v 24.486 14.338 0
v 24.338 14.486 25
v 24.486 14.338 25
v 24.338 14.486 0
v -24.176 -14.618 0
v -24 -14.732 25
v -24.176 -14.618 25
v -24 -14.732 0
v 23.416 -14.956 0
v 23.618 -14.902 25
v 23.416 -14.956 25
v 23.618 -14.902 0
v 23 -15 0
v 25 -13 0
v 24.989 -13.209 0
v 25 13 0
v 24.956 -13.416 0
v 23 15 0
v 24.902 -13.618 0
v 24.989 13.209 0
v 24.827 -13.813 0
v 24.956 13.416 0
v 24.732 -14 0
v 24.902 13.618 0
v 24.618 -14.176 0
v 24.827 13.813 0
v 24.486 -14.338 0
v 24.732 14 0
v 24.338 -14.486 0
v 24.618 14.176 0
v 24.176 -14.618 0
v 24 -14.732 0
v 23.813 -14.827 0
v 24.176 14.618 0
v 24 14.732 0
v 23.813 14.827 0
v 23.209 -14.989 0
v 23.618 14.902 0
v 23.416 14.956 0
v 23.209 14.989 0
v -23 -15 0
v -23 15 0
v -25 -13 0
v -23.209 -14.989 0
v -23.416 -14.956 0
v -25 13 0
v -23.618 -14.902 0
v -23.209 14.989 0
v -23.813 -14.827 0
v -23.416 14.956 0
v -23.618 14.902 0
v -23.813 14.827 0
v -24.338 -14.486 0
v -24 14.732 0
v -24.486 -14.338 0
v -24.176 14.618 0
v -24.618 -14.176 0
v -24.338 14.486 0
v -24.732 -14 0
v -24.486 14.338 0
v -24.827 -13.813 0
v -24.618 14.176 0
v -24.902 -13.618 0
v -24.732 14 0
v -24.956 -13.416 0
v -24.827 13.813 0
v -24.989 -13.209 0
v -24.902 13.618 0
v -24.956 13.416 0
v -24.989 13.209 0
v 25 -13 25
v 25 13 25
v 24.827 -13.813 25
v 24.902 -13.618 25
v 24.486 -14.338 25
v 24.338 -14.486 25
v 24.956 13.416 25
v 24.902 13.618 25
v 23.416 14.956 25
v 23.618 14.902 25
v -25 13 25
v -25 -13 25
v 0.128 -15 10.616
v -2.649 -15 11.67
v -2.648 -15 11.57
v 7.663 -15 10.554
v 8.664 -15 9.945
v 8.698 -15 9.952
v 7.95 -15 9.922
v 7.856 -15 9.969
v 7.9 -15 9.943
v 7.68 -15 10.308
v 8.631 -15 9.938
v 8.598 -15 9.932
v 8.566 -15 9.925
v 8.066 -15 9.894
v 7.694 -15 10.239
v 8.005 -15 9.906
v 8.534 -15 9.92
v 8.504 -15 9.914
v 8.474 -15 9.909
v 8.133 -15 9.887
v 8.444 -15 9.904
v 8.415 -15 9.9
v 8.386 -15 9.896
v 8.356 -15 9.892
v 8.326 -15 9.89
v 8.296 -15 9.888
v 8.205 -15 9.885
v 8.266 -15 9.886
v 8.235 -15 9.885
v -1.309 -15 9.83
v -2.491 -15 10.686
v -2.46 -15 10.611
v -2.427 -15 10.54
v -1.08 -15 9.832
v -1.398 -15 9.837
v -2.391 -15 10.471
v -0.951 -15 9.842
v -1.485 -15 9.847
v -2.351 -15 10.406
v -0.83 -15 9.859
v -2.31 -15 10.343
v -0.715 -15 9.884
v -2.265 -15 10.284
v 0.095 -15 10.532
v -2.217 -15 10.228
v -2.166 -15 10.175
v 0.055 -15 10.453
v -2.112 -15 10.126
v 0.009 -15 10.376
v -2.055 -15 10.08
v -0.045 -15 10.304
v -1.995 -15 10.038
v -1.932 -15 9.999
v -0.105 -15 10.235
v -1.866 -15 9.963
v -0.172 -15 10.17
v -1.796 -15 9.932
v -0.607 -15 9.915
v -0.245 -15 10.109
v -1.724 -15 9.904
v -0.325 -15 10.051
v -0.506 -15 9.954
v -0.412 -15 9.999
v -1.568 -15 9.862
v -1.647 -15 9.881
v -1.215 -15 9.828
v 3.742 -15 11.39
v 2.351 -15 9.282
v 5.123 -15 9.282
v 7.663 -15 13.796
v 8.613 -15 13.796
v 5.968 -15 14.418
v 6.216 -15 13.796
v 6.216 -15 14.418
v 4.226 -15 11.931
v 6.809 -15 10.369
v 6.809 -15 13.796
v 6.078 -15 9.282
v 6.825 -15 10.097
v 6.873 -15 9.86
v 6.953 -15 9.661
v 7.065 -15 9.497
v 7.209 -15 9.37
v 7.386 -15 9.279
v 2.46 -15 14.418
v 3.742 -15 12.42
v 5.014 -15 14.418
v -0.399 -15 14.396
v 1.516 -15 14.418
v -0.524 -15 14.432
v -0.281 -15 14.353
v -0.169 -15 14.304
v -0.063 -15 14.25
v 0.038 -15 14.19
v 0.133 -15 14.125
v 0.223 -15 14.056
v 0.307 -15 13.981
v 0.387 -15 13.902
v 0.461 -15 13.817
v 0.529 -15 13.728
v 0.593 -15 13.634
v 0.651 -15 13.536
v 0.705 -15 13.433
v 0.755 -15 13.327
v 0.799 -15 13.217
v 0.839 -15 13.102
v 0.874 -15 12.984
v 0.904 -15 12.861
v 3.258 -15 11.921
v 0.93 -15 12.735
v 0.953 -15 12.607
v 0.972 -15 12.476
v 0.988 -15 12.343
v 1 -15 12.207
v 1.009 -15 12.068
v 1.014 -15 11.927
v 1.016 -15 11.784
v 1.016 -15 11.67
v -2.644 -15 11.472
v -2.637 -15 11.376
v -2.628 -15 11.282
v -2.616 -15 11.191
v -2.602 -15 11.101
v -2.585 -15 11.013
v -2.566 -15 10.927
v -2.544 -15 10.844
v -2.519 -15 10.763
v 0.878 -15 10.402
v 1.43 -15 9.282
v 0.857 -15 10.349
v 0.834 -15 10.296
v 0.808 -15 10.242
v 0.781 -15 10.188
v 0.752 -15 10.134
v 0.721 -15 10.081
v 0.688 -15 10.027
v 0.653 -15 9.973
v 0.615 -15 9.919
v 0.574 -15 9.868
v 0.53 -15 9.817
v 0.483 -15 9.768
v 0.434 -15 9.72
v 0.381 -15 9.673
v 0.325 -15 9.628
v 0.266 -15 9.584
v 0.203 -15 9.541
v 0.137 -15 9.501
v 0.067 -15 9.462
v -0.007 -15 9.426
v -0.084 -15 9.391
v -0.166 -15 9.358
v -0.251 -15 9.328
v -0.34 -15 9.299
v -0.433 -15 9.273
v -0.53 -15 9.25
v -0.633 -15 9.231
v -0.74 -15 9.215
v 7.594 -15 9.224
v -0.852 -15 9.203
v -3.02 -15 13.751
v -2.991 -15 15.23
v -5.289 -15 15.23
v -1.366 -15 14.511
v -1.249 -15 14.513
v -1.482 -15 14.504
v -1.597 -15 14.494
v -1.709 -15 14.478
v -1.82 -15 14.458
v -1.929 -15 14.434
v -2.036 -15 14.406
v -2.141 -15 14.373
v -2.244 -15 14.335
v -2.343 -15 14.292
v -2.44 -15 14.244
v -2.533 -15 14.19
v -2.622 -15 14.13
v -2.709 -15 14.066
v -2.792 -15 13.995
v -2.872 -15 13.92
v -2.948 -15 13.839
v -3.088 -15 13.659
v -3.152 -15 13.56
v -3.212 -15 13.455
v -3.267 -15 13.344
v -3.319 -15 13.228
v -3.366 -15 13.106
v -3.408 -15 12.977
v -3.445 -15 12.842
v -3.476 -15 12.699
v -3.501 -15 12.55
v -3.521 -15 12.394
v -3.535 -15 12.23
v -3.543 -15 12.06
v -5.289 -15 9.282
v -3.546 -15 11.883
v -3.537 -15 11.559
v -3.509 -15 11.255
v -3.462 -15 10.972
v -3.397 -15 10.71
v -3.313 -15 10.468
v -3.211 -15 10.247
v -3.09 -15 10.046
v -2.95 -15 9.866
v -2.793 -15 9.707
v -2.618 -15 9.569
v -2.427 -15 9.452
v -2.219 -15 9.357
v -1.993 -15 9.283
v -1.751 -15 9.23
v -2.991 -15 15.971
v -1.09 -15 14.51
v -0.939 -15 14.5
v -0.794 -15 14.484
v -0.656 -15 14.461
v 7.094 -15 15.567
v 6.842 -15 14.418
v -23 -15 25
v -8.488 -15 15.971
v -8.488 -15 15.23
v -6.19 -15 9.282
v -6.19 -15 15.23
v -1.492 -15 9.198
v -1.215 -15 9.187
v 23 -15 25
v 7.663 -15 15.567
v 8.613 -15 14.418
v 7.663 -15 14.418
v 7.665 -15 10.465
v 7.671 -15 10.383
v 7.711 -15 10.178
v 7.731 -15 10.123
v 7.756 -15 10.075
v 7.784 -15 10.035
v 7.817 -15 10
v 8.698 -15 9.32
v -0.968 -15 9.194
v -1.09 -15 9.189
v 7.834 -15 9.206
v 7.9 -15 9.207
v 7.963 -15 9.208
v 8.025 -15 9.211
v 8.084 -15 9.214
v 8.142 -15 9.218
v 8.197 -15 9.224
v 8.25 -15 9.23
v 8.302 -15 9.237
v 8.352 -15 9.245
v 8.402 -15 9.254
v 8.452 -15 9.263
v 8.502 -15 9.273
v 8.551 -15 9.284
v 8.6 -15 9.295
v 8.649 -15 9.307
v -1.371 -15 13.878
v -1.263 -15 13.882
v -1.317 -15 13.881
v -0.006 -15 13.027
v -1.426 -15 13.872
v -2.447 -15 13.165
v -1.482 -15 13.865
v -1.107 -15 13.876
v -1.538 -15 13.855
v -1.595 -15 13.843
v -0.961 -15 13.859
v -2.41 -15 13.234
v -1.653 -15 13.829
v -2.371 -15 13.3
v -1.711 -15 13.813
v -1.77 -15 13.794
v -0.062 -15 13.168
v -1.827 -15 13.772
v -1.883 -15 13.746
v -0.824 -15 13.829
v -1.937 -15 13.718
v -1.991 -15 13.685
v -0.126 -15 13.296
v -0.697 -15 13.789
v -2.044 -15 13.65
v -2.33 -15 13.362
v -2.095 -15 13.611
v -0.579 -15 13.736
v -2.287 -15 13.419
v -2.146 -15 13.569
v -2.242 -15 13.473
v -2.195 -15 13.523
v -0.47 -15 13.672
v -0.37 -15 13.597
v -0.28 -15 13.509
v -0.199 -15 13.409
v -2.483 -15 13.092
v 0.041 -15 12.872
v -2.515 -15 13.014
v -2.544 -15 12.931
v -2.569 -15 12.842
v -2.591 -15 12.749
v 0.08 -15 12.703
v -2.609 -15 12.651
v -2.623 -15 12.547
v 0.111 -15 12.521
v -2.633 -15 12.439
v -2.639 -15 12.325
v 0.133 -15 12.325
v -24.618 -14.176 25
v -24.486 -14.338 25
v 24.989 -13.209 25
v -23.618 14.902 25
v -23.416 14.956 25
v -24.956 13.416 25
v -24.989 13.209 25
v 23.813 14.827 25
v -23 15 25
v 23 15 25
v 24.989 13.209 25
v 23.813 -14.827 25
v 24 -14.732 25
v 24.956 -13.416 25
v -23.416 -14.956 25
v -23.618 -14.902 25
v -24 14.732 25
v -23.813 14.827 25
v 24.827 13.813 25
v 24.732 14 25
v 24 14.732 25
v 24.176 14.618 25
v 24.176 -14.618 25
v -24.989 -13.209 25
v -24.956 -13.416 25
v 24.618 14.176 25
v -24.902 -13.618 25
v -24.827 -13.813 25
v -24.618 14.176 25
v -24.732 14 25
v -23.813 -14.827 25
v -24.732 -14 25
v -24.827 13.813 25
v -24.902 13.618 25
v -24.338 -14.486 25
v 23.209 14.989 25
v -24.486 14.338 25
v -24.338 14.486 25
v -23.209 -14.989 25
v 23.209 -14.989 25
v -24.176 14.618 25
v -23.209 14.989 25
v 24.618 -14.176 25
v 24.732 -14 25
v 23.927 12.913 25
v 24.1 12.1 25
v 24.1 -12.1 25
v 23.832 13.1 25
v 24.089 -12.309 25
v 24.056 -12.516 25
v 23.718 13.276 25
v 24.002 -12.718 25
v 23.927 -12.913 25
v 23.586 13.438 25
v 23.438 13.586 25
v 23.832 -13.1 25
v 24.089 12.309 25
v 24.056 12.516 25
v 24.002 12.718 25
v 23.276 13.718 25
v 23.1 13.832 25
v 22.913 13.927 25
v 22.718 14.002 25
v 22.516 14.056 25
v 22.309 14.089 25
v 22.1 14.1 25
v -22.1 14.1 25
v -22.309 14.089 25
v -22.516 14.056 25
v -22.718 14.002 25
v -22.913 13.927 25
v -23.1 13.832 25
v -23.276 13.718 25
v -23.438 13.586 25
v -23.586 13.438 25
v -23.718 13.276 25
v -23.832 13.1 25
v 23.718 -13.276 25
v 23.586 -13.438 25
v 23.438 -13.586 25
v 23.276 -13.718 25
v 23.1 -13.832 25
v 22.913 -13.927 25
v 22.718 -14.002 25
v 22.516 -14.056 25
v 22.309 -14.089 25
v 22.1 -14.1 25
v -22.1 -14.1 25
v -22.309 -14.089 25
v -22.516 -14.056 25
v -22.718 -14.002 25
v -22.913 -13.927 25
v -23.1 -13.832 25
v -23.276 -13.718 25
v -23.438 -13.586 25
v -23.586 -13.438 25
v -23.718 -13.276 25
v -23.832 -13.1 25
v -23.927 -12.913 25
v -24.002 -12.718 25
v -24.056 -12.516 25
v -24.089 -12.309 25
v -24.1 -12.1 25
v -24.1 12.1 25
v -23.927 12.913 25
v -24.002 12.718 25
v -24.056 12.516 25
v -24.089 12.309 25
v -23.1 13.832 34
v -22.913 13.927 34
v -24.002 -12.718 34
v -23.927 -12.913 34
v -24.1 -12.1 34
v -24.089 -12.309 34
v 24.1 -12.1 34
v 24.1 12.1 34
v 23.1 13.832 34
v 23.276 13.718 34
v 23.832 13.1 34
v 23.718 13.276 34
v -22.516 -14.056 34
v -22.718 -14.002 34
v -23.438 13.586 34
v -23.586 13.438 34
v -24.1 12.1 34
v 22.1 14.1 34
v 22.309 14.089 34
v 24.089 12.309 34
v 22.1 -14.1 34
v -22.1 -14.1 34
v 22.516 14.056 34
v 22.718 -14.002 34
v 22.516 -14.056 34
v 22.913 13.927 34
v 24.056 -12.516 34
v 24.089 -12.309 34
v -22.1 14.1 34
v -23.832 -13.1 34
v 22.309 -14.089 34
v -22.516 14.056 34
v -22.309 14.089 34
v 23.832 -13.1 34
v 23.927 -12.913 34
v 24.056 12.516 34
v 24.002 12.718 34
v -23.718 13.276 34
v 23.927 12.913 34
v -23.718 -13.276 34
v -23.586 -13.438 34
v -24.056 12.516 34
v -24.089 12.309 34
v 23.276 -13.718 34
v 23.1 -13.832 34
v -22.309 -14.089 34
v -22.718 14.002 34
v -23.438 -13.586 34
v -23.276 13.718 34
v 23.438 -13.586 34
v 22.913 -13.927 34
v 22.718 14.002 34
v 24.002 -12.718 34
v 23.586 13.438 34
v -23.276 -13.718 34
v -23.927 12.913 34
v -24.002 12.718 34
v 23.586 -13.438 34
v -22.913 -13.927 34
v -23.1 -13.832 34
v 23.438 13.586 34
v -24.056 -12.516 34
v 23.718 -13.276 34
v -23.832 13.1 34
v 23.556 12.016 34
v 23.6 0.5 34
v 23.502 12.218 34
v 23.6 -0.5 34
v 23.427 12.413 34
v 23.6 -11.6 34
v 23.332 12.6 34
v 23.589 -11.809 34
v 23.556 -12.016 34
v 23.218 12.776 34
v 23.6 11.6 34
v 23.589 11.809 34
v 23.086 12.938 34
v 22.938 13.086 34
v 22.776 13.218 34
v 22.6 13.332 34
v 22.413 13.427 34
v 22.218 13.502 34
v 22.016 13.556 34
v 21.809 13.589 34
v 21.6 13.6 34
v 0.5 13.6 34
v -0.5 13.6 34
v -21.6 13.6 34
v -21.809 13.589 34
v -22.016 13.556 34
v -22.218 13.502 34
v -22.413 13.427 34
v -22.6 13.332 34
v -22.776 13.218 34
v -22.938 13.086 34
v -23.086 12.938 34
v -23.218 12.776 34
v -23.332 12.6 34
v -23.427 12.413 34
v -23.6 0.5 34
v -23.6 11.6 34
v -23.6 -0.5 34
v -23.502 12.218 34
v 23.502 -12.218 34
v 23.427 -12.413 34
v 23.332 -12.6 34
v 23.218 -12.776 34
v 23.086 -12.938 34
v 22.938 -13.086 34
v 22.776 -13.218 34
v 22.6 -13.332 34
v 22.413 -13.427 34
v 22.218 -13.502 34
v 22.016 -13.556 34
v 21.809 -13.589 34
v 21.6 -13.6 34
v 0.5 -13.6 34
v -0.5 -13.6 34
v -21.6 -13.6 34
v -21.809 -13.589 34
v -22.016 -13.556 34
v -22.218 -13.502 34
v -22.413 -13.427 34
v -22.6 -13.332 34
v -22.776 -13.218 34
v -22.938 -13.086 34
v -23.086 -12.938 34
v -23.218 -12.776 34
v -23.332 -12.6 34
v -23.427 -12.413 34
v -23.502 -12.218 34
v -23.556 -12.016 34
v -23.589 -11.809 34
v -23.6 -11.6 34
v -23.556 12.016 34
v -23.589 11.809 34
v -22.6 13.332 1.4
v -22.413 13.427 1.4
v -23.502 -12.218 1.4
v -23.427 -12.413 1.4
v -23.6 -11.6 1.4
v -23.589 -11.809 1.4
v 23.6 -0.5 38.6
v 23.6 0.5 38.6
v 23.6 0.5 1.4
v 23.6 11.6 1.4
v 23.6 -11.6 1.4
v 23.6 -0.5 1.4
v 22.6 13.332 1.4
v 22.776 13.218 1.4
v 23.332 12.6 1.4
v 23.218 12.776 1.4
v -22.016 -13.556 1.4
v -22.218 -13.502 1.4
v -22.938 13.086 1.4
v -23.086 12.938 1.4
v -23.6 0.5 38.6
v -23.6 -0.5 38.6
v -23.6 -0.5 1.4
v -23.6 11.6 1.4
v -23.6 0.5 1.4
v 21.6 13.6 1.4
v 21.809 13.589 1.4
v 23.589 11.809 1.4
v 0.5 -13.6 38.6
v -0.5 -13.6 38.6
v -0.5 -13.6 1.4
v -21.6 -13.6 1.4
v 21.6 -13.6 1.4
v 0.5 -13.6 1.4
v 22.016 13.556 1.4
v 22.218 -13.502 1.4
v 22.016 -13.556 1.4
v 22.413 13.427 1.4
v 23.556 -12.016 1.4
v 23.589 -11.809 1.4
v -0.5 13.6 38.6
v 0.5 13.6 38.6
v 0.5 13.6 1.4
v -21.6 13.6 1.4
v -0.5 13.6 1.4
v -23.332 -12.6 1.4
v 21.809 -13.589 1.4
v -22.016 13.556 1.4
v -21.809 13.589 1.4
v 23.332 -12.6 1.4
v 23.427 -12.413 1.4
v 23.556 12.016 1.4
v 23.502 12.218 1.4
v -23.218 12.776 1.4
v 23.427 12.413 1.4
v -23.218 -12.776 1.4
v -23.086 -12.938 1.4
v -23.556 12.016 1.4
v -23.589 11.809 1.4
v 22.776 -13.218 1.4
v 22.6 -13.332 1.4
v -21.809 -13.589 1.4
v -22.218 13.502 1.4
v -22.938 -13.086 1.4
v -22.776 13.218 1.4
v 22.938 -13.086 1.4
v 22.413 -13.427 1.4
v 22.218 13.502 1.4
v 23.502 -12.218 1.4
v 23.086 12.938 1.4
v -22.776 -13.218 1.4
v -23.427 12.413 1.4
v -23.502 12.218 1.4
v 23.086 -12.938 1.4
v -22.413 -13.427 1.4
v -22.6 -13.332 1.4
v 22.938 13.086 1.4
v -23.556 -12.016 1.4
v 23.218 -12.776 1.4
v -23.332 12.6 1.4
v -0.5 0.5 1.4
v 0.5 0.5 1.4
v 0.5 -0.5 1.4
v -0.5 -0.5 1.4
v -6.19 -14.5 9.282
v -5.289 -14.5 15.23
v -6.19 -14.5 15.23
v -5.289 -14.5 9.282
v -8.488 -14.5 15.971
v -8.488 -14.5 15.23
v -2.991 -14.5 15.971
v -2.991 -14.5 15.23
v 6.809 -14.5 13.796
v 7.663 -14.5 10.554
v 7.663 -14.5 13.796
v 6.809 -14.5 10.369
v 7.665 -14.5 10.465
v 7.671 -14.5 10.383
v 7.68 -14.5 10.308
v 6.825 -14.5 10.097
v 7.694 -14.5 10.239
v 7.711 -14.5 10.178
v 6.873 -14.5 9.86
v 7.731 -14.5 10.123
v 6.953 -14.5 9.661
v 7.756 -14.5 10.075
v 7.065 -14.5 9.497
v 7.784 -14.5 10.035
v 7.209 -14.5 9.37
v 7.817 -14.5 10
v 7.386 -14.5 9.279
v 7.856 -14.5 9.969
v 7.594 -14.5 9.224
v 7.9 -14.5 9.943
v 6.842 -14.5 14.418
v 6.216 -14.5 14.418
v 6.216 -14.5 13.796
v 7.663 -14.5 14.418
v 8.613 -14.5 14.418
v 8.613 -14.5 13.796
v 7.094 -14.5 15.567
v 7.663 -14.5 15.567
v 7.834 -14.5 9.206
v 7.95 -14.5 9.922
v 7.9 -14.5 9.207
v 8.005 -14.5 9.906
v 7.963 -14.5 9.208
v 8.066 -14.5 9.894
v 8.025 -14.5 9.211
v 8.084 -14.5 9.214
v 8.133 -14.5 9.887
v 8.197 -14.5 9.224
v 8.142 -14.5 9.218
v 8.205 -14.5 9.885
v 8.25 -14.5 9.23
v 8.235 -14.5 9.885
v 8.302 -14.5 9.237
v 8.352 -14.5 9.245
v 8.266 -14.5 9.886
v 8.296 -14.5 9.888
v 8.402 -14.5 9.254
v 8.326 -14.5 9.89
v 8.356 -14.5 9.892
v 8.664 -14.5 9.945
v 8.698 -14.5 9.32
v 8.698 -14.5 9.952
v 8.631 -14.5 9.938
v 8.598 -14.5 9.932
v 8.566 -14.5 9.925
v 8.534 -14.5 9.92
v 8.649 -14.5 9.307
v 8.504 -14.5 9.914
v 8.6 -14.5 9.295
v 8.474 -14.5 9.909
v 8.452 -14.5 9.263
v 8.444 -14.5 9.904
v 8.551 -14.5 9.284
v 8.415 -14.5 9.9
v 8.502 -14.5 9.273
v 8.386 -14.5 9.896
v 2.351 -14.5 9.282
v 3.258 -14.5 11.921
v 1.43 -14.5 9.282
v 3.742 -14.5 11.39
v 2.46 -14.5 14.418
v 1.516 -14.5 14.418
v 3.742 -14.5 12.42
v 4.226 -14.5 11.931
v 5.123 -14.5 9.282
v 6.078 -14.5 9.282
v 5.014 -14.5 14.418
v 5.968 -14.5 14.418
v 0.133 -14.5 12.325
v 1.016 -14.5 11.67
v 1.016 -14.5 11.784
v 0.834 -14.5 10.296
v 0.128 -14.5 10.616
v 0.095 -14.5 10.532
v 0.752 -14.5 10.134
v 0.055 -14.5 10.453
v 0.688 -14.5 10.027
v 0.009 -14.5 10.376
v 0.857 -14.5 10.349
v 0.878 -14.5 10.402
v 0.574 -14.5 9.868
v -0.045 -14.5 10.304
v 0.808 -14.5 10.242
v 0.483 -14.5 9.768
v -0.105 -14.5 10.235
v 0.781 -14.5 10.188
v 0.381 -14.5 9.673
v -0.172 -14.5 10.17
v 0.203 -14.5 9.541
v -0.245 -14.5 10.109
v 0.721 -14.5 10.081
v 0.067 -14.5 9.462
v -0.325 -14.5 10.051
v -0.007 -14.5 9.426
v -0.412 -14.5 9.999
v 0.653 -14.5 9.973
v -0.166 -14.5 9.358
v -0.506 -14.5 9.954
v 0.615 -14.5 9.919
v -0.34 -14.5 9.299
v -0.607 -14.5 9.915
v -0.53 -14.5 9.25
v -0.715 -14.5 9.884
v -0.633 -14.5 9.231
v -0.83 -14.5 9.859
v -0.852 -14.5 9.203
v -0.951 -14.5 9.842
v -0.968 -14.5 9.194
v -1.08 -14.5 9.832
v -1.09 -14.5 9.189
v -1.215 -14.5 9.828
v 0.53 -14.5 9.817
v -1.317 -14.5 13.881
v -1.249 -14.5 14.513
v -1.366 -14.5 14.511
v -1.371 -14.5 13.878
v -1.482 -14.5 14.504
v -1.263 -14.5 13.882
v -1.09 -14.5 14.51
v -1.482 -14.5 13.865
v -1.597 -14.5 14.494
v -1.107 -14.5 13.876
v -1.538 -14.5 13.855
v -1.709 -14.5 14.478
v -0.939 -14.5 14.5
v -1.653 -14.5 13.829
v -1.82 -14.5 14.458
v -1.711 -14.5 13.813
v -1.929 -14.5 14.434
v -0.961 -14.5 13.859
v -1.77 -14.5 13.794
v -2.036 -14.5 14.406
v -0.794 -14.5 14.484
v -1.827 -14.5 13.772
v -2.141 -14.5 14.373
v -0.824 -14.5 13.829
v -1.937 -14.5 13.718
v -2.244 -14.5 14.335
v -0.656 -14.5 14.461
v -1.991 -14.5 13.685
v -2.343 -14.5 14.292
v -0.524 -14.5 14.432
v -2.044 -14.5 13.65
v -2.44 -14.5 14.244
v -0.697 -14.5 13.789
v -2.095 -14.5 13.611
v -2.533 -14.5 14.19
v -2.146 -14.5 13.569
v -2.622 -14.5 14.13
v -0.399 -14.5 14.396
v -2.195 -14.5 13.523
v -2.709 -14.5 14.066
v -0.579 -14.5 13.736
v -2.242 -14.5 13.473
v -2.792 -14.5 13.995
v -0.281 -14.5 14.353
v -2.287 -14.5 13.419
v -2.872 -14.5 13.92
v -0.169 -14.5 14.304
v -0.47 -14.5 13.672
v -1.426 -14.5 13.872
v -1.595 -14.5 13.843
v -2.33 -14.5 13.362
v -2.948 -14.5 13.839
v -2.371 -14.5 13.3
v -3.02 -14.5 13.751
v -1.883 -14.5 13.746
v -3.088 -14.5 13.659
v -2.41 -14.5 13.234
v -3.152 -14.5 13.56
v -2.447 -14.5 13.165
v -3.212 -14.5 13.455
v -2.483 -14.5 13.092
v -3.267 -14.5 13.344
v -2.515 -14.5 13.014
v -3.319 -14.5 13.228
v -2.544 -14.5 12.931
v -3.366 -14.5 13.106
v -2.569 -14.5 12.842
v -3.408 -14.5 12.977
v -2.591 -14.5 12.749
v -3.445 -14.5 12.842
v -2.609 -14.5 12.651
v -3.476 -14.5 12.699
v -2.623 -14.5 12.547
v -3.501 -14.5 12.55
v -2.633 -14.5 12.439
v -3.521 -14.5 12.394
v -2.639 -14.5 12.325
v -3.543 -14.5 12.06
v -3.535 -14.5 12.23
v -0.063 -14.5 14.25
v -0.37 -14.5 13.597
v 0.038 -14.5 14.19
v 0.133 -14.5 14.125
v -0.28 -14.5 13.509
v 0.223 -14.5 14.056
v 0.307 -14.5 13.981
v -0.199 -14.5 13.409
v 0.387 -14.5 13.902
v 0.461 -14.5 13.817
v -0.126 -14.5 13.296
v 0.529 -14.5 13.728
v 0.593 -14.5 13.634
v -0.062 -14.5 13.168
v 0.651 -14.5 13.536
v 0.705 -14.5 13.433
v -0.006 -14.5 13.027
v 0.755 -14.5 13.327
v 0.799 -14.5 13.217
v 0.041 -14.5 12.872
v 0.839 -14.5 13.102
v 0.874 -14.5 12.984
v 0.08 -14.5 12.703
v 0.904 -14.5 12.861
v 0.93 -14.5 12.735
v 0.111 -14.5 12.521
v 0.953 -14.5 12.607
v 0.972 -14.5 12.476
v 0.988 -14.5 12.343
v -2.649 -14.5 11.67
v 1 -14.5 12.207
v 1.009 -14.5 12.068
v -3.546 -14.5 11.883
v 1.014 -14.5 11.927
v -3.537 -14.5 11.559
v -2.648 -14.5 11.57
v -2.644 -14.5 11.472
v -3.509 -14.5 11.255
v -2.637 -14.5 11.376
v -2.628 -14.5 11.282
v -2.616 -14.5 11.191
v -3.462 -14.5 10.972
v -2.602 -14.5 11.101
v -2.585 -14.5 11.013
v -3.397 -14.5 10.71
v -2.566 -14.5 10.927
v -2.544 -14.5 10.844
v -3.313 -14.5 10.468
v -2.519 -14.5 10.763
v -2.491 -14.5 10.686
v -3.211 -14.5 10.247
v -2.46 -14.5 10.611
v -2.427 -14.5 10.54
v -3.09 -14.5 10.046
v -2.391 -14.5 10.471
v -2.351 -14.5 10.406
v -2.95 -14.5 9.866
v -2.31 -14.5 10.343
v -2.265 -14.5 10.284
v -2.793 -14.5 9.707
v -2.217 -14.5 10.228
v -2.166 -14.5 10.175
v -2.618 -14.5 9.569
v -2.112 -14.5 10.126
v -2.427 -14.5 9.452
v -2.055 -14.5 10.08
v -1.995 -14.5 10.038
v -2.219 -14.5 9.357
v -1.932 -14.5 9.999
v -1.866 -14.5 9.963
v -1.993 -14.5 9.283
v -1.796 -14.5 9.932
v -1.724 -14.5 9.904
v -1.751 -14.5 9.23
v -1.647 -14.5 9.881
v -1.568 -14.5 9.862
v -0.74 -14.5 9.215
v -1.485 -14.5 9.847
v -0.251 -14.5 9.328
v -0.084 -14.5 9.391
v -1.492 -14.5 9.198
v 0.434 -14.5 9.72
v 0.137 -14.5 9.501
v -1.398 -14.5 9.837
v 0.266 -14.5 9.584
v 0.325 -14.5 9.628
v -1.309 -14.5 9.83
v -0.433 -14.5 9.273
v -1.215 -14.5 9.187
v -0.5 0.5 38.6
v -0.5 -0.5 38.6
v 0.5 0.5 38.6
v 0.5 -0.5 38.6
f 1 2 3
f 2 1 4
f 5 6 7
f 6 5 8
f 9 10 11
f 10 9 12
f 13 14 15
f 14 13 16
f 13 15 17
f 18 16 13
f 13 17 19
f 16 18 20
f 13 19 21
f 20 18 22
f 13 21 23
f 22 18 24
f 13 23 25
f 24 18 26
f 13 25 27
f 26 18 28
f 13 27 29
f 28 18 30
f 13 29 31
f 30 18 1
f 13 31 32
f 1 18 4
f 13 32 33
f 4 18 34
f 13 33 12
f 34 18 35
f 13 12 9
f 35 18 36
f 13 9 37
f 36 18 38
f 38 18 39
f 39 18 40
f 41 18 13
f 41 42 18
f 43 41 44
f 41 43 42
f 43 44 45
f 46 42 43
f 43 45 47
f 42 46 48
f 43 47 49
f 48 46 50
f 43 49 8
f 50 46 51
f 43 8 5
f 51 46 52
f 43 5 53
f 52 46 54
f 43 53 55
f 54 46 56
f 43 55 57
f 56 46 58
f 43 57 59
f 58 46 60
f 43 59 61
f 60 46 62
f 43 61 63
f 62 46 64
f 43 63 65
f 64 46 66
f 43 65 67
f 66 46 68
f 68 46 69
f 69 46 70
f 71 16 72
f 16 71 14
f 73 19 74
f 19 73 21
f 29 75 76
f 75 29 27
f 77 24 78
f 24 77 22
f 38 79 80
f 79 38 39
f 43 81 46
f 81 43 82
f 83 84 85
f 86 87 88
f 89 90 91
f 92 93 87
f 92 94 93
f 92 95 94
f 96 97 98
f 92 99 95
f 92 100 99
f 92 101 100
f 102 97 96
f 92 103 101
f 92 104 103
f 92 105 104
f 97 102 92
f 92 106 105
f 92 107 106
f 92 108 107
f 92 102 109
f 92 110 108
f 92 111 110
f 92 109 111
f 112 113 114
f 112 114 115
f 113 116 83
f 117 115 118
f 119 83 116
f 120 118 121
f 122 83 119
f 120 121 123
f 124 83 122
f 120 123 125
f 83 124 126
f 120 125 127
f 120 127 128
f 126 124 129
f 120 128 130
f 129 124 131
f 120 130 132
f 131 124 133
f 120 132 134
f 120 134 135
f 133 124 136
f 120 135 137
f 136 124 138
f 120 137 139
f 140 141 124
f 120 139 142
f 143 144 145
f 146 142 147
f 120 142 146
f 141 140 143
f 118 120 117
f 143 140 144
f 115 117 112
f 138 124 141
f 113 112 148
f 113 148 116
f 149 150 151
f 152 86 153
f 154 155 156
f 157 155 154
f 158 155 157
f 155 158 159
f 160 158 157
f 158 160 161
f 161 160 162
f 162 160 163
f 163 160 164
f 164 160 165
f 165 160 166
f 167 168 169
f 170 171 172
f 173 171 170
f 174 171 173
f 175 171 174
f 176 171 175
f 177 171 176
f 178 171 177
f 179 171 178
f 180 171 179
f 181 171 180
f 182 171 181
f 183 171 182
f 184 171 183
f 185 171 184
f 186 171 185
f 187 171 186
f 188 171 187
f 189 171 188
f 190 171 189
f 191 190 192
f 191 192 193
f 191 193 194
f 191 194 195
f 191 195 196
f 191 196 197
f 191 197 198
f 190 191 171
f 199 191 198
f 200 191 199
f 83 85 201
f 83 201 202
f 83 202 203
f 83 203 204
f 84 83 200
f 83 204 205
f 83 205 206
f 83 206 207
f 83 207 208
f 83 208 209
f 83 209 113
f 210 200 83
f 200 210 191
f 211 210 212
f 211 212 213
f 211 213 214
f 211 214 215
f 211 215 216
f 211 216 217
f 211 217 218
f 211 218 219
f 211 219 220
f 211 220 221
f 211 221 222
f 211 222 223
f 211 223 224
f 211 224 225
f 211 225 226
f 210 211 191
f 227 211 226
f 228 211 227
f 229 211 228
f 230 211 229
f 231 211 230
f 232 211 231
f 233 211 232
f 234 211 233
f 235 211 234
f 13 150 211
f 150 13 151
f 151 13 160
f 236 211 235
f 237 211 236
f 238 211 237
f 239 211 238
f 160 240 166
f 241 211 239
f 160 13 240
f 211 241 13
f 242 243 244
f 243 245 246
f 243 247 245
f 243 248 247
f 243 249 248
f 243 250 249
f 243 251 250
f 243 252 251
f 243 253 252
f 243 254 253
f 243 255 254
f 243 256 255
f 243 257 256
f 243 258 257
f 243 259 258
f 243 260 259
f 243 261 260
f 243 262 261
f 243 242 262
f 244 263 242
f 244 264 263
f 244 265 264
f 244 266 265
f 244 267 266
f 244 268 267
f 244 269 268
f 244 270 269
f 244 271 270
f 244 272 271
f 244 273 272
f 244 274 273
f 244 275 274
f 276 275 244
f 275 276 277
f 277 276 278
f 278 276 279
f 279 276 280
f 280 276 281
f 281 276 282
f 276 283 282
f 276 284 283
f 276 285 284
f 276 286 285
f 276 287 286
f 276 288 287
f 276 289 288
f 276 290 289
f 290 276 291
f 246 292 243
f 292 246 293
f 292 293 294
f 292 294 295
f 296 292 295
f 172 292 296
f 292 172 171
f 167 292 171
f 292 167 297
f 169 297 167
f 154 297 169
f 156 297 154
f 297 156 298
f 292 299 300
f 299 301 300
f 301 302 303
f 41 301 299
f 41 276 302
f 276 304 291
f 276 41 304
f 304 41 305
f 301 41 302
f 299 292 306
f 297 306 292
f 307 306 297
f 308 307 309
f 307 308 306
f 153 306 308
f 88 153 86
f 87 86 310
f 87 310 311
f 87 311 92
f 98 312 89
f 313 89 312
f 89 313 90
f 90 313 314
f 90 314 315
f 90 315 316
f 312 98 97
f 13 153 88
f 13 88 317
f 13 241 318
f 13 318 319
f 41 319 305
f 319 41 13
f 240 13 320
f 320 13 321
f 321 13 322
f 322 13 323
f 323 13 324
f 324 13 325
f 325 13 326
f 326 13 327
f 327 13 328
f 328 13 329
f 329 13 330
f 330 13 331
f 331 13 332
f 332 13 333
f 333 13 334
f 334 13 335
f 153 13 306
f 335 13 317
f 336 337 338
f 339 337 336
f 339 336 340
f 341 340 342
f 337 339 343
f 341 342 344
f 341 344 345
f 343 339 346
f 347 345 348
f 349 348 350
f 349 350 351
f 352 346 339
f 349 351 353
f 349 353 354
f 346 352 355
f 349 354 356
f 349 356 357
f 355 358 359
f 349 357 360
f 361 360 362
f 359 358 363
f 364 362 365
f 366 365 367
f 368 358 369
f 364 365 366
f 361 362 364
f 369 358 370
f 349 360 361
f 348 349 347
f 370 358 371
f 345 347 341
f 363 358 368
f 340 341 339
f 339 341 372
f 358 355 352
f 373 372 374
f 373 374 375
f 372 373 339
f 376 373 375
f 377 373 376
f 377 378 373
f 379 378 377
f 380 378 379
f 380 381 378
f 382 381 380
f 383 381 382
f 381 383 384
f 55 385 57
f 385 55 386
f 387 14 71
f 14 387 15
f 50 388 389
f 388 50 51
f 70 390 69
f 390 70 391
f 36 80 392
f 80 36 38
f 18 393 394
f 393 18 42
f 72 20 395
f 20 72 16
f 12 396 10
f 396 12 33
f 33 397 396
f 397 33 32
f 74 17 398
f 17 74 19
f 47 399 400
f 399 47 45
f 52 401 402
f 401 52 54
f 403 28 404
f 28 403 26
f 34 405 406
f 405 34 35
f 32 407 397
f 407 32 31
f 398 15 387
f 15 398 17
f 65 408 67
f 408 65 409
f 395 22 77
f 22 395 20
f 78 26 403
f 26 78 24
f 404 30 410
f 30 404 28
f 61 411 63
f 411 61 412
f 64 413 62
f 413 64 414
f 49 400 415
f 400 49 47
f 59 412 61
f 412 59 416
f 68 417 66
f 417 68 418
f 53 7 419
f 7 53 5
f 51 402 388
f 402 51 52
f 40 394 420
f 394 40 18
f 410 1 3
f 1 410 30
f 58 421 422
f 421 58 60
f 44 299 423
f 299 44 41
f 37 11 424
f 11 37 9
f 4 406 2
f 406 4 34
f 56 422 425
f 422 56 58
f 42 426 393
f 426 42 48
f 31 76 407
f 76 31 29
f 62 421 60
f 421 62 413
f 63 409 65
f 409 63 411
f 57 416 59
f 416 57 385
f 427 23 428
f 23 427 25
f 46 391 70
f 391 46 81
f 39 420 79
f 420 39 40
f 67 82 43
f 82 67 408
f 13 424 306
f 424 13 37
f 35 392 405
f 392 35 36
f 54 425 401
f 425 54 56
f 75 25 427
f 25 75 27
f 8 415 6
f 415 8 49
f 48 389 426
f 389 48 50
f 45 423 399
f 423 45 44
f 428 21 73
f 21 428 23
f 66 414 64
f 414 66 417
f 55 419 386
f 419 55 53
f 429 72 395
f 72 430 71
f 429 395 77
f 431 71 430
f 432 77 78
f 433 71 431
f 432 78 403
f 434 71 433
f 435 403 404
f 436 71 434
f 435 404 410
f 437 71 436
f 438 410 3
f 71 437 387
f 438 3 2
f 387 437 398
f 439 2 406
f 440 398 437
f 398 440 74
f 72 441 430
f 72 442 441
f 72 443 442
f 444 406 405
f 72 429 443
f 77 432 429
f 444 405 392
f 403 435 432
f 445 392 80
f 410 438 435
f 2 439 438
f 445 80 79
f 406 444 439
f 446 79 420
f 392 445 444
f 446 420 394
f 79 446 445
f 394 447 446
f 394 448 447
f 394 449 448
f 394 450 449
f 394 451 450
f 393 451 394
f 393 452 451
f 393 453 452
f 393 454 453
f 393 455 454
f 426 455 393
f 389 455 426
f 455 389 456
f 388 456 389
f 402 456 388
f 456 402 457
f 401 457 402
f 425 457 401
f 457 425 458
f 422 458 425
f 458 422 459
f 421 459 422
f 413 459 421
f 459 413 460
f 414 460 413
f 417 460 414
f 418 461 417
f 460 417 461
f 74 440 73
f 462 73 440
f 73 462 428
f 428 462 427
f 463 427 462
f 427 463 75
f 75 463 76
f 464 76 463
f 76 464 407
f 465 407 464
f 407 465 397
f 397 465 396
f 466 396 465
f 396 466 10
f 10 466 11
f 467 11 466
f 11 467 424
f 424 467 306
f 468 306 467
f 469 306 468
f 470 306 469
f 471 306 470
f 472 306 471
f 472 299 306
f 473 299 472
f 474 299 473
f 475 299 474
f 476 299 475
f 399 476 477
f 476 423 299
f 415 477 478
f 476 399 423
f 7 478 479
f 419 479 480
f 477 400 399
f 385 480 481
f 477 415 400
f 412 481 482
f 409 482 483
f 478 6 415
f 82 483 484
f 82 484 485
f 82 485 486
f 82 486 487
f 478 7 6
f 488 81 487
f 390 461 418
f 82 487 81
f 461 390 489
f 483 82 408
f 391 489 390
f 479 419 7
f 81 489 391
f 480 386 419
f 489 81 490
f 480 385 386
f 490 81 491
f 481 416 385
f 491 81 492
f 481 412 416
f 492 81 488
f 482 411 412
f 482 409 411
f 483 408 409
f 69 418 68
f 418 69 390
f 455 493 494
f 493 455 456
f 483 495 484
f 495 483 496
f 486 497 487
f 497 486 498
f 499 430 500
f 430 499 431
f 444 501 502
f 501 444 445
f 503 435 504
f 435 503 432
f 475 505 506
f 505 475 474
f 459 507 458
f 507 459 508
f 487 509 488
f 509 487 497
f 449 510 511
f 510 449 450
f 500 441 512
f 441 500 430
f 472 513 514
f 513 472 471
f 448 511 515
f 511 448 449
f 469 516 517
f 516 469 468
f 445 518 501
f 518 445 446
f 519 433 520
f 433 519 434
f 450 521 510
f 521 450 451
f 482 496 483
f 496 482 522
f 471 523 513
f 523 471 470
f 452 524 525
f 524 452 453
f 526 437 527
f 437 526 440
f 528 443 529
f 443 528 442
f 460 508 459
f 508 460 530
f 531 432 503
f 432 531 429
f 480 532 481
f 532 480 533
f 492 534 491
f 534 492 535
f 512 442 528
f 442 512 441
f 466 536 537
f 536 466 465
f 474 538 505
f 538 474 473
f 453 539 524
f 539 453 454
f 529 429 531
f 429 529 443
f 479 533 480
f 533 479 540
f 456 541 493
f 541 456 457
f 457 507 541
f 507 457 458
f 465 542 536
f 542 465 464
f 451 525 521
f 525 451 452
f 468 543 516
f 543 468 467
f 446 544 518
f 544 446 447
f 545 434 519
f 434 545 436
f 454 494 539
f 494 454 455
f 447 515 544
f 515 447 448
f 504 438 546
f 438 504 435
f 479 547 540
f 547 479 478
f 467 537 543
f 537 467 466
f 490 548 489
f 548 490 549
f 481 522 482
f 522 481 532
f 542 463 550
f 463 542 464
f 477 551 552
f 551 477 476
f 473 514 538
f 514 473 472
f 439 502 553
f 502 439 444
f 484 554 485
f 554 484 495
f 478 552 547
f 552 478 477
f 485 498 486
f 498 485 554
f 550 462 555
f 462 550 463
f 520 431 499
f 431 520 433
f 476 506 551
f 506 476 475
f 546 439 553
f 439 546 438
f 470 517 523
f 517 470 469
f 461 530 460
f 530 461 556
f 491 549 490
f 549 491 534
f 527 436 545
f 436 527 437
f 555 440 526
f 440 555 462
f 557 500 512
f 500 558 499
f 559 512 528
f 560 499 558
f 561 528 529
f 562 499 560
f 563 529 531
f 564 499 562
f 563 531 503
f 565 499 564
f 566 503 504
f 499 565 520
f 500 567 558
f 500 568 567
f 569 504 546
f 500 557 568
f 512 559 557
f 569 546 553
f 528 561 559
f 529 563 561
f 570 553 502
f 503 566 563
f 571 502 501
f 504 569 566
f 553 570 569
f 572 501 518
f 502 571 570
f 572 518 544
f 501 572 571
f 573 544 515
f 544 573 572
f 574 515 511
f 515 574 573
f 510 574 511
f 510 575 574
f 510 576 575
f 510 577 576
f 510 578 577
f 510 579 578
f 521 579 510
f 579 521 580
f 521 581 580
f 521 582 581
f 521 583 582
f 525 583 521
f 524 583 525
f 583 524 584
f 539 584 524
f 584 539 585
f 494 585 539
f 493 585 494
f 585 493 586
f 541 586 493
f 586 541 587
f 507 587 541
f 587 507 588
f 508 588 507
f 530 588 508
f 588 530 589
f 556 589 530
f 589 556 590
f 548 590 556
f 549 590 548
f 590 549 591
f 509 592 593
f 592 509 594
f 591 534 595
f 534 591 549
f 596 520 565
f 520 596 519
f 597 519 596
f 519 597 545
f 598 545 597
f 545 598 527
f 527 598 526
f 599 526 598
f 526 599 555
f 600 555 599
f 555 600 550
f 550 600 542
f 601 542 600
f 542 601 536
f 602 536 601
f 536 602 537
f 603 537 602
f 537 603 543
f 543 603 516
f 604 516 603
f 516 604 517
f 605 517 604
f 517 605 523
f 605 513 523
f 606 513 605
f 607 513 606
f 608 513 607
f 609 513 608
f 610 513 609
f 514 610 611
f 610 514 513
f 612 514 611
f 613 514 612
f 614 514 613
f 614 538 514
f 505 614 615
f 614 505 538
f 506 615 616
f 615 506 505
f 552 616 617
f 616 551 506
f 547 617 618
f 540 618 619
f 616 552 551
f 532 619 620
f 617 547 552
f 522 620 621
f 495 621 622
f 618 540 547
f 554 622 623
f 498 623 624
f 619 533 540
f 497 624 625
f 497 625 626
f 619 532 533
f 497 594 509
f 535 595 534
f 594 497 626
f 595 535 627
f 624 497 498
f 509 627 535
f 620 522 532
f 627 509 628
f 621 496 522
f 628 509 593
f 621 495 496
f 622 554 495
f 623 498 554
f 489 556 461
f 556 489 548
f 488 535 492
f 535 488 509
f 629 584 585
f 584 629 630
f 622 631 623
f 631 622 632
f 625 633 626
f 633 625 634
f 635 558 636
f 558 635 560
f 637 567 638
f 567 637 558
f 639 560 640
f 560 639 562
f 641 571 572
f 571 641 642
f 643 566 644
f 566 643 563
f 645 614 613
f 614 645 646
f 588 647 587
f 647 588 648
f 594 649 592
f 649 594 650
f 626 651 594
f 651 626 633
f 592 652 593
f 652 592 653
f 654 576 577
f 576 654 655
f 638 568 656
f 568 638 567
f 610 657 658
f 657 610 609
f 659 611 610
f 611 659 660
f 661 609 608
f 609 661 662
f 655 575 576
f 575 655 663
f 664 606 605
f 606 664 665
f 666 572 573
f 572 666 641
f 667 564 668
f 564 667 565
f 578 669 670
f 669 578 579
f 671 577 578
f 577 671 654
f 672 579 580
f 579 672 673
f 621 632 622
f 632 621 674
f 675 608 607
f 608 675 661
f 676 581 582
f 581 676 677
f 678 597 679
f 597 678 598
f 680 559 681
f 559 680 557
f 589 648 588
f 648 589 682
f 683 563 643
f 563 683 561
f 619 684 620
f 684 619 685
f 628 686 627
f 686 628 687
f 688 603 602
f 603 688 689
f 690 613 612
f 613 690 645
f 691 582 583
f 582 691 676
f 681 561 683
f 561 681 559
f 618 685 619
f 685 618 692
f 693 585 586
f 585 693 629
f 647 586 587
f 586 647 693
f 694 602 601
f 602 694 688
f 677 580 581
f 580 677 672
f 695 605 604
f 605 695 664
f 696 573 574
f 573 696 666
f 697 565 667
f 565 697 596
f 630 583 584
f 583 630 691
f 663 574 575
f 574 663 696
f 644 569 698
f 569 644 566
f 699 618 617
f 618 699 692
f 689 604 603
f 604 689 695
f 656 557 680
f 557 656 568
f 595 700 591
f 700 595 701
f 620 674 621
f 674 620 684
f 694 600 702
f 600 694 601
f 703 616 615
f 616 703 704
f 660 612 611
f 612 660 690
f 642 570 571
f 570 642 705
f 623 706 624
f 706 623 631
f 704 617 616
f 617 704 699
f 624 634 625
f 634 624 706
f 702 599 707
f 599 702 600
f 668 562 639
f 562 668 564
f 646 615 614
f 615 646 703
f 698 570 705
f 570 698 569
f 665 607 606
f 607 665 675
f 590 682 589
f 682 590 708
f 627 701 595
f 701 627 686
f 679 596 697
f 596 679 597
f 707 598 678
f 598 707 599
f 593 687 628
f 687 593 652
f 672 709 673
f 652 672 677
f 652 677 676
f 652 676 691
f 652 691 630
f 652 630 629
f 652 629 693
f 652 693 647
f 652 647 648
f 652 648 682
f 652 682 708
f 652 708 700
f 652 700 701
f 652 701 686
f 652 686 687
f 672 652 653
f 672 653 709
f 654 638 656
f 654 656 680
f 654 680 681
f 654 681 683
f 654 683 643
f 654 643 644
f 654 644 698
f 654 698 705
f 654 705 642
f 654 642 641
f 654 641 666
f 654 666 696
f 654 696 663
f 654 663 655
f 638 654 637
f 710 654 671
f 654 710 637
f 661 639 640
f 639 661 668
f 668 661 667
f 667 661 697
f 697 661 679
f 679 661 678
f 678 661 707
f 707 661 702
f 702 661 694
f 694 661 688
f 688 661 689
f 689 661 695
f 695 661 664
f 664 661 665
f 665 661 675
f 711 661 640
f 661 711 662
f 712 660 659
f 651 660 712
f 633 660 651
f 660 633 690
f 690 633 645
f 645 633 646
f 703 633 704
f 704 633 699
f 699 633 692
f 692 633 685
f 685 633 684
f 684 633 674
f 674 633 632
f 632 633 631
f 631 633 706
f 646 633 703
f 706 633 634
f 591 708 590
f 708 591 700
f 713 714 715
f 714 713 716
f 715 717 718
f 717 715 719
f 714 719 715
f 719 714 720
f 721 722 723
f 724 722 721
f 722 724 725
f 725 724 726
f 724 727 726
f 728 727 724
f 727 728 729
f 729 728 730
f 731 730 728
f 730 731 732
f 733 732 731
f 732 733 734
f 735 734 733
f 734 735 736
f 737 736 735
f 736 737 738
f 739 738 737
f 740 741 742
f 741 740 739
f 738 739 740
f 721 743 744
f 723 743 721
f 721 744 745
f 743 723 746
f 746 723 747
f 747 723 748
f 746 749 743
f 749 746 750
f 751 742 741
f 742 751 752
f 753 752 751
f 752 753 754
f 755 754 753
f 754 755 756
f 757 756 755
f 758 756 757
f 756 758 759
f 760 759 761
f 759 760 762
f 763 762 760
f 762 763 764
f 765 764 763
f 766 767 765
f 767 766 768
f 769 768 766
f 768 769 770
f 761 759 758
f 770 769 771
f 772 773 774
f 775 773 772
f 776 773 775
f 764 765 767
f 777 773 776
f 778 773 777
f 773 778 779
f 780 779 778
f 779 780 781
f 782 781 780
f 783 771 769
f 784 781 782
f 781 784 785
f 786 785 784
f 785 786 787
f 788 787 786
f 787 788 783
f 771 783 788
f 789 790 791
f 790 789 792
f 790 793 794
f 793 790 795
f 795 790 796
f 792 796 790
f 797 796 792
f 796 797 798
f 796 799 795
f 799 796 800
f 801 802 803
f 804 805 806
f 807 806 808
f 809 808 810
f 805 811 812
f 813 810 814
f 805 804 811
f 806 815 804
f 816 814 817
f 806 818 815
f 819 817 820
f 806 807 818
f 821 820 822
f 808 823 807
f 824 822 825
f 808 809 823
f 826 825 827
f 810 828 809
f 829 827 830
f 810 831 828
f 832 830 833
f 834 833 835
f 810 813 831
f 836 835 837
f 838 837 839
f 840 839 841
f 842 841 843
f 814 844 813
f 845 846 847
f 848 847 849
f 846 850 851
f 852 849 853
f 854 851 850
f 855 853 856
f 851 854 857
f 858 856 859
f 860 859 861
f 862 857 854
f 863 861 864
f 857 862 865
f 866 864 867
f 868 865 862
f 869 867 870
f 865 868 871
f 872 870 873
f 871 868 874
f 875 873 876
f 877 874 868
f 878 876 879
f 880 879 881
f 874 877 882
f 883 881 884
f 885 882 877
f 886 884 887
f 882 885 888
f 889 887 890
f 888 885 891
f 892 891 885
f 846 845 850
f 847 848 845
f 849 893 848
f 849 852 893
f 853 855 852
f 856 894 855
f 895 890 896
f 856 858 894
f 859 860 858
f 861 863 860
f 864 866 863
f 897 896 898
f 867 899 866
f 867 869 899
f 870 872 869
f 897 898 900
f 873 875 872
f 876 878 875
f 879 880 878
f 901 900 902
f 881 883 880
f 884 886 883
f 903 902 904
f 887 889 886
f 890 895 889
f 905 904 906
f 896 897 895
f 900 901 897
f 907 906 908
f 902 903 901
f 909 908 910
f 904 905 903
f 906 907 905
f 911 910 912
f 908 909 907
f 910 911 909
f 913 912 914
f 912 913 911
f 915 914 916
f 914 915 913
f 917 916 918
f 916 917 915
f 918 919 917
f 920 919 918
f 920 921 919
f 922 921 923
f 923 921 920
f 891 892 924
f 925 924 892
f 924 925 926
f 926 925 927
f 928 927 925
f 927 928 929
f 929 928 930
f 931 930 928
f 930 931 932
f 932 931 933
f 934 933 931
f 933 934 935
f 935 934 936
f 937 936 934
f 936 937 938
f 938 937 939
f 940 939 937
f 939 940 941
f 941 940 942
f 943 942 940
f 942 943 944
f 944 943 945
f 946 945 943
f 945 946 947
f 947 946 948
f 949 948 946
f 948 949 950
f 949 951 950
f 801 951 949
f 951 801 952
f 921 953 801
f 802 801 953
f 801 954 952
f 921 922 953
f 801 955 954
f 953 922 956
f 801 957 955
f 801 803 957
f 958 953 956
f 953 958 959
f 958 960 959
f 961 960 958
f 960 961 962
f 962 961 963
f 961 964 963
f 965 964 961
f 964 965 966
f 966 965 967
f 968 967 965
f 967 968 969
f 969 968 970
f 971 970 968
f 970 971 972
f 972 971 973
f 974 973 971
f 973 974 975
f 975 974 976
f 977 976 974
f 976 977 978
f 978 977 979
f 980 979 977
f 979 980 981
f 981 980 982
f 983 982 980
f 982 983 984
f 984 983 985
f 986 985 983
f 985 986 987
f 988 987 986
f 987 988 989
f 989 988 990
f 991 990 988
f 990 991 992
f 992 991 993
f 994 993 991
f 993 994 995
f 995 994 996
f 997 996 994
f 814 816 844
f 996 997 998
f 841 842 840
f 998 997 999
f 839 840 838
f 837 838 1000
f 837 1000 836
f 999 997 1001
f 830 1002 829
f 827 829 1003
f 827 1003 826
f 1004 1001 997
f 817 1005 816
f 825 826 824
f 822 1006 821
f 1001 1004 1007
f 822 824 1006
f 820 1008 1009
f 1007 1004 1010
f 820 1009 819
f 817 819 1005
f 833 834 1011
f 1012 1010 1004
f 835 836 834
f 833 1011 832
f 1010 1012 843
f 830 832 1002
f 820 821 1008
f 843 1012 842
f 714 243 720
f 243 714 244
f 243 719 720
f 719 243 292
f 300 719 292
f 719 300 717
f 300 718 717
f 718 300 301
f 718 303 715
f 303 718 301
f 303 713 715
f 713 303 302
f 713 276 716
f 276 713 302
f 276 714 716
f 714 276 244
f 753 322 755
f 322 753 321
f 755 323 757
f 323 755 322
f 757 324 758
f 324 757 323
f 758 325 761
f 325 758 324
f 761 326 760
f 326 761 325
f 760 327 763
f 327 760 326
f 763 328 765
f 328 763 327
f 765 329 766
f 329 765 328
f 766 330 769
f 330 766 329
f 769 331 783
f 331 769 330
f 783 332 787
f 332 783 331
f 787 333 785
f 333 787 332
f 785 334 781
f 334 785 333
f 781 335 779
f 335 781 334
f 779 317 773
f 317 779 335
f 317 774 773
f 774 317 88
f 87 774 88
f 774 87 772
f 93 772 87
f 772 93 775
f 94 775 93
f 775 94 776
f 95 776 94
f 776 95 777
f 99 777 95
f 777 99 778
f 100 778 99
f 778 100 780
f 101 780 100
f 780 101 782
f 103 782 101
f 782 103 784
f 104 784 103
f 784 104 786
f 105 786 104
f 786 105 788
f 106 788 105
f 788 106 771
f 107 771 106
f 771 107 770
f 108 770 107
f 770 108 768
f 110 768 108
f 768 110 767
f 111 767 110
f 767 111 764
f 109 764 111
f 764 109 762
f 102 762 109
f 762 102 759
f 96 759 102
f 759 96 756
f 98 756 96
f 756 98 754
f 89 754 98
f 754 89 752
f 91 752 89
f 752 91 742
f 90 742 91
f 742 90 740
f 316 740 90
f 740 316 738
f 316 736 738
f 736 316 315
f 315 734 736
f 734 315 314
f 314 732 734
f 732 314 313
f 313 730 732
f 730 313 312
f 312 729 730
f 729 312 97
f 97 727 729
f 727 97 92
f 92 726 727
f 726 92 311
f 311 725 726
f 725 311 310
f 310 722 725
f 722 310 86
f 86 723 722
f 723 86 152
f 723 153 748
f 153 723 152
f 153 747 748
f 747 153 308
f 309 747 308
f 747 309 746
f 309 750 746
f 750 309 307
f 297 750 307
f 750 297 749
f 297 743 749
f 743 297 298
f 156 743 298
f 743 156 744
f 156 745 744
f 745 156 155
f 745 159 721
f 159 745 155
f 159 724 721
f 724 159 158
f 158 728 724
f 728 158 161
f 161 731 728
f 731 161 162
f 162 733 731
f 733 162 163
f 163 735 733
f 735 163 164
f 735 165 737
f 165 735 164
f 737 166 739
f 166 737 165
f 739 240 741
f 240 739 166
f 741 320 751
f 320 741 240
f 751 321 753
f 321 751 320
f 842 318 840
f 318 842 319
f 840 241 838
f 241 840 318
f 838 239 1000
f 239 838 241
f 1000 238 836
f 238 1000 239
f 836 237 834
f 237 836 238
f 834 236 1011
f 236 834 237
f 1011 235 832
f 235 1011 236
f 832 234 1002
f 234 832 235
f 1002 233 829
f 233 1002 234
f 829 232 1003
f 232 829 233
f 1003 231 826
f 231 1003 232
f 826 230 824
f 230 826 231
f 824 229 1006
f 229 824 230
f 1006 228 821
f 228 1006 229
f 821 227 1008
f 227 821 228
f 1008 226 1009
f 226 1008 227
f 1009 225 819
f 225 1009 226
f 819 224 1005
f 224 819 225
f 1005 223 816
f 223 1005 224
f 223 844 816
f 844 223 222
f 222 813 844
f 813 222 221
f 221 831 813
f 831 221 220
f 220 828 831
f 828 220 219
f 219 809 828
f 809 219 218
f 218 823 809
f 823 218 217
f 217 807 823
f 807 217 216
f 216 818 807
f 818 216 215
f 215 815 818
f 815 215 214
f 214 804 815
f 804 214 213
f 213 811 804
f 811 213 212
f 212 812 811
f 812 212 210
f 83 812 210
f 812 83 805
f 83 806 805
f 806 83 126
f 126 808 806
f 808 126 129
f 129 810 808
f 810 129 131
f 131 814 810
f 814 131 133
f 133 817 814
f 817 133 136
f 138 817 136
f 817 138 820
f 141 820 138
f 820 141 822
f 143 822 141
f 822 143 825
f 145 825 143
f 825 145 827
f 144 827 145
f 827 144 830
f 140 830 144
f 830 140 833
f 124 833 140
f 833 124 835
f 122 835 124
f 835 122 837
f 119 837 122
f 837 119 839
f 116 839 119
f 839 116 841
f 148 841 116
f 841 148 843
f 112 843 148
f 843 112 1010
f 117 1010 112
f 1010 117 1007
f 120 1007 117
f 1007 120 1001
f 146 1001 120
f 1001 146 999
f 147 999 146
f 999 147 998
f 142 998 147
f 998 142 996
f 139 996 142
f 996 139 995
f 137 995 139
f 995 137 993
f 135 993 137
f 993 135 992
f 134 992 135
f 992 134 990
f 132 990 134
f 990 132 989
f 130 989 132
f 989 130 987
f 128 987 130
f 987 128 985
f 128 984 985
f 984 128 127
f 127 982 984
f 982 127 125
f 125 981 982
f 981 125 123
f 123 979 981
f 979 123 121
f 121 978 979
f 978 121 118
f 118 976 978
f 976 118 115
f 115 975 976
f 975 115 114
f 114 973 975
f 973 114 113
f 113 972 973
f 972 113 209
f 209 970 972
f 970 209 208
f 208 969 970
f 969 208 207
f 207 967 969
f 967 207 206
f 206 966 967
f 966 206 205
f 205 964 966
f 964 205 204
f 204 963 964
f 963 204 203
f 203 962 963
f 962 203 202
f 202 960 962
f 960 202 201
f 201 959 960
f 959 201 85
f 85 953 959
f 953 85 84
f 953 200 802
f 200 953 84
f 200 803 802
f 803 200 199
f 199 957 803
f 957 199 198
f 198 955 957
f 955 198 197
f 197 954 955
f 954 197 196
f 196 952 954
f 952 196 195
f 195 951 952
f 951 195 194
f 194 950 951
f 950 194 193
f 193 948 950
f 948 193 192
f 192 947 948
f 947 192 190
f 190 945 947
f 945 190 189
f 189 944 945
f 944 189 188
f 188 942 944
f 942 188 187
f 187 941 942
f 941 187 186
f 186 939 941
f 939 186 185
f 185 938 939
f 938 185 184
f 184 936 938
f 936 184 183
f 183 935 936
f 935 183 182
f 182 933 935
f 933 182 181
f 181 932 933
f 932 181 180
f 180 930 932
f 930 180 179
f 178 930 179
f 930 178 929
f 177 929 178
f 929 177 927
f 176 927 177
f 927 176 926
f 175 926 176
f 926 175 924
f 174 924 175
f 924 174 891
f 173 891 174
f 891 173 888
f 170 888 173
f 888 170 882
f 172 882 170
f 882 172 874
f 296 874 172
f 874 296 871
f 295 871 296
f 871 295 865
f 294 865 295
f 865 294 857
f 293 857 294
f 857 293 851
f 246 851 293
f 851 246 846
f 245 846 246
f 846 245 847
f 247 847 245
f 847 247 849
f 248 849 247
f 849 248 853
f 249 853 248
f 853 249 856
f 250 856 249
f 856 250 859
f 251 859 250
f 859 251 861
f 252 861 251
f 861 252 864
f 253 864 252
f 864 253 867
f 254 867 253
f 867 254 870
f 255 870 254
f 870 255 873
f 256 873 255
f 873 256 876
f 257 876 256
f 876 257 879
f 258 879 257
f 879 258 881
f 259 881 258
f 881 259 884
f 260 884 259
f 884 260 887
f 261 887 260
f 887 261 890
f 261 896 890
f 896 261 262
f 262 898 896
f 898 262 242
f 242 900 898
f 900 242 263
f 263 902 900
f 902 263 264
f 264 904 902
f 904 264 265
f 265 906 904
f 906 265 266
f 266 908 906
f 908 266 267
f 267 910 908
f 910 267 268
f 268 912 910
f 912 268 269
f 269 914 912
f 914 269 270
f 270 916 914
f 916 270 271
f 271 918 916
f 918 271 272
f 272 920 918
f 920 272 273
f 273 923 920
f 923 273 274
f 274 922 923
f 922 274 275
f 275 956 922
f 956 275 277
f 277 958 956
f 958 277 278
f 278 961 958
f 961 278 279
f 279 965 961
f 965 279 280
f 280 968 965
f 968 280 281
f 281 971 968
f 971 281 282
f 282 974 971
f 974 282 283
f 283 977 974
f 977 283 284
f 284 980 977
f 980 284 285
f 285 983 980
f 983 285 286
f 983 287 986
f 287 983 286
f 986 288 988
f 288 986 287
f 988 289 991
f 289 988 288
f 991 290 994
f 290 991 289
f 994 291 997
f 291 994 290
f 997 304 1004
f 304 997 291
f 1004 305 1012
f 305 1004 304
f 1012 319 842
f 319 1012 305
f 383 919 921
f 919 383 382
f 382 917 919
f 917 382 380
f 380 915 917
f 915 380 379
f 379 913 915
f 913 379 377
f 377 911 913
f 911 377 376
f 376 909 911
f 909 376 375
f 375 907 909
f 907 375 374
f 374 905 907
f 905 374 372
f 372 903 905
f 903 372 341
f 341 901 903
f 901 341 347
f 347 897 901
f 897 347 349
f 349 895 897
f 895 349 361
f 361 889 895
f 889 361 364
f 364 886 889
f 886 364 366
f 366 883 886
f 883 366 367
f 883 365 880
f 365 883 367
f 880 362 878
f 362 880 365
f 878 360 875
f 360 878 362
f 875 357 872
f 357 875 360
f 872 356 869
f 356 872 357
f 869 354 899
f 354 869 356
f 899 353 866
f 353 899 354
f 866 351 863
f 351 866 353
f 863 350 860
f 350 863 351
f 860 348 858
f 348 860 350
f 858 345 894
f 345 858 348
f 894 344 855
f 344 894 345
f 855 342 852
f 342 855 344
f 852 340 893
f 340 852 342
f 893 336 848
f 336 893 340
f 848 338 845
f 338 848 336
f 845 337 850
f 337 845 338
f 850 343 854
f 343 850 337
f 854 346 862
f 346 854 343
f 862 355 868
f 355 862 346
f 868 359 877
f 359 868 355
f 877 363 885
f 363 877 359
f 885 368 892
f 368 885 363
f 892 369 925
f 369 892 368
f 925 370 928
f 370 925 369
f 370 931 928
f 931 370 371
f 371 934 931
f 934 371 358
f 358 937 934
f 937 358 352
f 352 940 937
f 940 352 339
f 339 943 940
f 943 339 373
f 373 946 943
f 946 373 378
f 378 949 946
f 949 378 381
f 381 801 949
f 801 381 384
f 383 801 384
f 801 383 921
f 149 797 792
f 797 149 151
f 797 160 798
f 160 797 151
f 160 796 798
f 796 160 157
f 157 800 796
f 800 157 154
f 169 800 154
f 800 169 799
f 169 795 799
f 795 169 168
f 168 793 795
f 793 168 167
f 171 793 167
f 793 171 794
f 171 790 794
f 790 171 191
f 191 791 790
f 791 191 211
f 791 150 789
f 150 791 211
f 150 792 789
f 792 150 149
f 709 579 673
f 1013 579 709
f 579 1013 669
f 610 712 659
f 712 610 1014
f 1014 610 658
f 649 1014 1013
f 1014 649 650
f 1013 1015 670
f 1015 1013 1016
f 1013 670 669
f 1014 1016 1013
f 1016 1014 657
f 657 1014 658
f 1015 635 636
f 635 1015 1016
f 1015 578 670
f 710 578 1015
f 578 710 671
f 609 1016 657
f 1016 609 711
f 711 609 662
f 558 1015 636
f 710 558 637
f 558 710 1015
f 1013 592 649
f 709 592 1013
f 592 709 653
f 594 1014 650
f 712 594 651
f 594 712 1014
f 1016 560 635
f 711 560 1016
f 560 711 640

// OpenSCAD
// Just for presentation purposes
showClosed = 1; // [0:Open, 1:Closed]

// Show parts
showParts = 0; // [0:All, 1:Base, 2:Lid]

// Outer box width
boxWidth = 50;

// Outer box depth
boxDepth = 30;

// Outer total box height
boxHeight = 40;

// Lid height
lidHeight = 15;

// Number of vertical spaces
numSeparatorsX = 2; // [1:20]

// Number of horizontal spaces
numSeparatorsY = 2; // [1:20]

// Outer wall thickness
wallThickness = 1.4;

// Tolerance
tolerance = 0.2;

// Text on base (empty to remove)
textBase = "Text";

// Base text size
textBaseSize = 7; // [3:50]

// Text on lid (empty to remove)
textLid = "Your";

// Lid text size
textLidSize = 8; // [3:50]


/* [Hidden] */
wt = wallThickness;

corner = 2;

$fn=60;

il=9;
iw=wt/2-tolerance;
internalWall = 1;

box();

module box() {
    if( showParts != 2 || showClosed ==1) {
        boxBase();
        separators(numSeparatorsX, numSeparatorsY, boxWidth, boxDepth, boxHeight-wt);
    }
    if (showClosed == 1 ) {
        %translate([0, 0, boxHeight]) rotate(a=[180, 0, 0]) boxLid();
    }
    else {
        if (showParts != 1) translate([boxWidth + 5, 0, 0]) boxLid();
    }
}


module separators (nx, ny, sizeX, sizeY, height) {
    xS = sizeX / nx;
    yS = sizeY / ny;
    union(){
        if ( nx > 1) {
            for ( a = [0 : nx-2] ) {
                translate([-sizeX/2+xS*(a+1), 0, 0])
                    linear_extrude(height=height)
                    square([internalWall, sizeY-2*wt], center = true);
            }
        }
        if ( ny > 1) {
            for ( b = [0 : ny-2] ) {
                translate([0, -sizeY/2+yS*(b+1), 0])
                    linear_extrude(height=height)
                    square([sizeX-2*wt, internalWall], center = true);
            }
        }
    }

}


module boxLid() {
    difference() {
        
        roundedCube(boxWidth, boxDepth, lidHeight, corner);
            
        translate([0, 0, lidHeight-il]) roundedCube(boxWidth-2*iw, boxDepth-2*iw, il+1, corner);
        translate([0, 0, wt]) roundedCube(boxWidth-2*wt, boxDepth-2*wt, lidHeight, corner);
        translate([0, 0, 0.5]) rotate(a=[180, 0, 0]) linear_extrude(height=2) text(textLid, valign="center", halign="center", font="Arial", size=textLidSize);
    }    
}

module boxBase() {
    difference(){
        union(){
            
            roundedCube(boxWidth, boxDepth, boxHeight-lidHeight, corner);
            translate([0, 0, boxHeight-lidHeight]) roundedCube(boxWidth-2*(wt-iw), boxDepth-2*(wt-iw), il, corner);
        }

        translate([0, 0, wt]) roundedCube(boxWidth-2*wt, boxDepth-2*wt, boxHeight, corner);
        translate([0, -boxDepth/2+0.5, (boxHeight-lidHeight)/2]) rotate(a=[90, 0, 0]) linear_extrude(height=2) text(textBase, valign="center", halign="center", font="Arial", size=textBaseSize);
        }
}


module roundedCube (w, d, h, r) {
    hull() {
        translate([-w/2+r, -d/2+r, 0]) cylinder(r=r, h=h);
        translate([-w/2+r, d/2-r, 0]) cylinder(r=r, h=h);    
        translate([w/2-r, -d/2+r, 0]) cylinder(r=r, h=h);
        translate([w/2-r, d/2-r, 0]) cylinder(r=r, h=h);
    }
}
